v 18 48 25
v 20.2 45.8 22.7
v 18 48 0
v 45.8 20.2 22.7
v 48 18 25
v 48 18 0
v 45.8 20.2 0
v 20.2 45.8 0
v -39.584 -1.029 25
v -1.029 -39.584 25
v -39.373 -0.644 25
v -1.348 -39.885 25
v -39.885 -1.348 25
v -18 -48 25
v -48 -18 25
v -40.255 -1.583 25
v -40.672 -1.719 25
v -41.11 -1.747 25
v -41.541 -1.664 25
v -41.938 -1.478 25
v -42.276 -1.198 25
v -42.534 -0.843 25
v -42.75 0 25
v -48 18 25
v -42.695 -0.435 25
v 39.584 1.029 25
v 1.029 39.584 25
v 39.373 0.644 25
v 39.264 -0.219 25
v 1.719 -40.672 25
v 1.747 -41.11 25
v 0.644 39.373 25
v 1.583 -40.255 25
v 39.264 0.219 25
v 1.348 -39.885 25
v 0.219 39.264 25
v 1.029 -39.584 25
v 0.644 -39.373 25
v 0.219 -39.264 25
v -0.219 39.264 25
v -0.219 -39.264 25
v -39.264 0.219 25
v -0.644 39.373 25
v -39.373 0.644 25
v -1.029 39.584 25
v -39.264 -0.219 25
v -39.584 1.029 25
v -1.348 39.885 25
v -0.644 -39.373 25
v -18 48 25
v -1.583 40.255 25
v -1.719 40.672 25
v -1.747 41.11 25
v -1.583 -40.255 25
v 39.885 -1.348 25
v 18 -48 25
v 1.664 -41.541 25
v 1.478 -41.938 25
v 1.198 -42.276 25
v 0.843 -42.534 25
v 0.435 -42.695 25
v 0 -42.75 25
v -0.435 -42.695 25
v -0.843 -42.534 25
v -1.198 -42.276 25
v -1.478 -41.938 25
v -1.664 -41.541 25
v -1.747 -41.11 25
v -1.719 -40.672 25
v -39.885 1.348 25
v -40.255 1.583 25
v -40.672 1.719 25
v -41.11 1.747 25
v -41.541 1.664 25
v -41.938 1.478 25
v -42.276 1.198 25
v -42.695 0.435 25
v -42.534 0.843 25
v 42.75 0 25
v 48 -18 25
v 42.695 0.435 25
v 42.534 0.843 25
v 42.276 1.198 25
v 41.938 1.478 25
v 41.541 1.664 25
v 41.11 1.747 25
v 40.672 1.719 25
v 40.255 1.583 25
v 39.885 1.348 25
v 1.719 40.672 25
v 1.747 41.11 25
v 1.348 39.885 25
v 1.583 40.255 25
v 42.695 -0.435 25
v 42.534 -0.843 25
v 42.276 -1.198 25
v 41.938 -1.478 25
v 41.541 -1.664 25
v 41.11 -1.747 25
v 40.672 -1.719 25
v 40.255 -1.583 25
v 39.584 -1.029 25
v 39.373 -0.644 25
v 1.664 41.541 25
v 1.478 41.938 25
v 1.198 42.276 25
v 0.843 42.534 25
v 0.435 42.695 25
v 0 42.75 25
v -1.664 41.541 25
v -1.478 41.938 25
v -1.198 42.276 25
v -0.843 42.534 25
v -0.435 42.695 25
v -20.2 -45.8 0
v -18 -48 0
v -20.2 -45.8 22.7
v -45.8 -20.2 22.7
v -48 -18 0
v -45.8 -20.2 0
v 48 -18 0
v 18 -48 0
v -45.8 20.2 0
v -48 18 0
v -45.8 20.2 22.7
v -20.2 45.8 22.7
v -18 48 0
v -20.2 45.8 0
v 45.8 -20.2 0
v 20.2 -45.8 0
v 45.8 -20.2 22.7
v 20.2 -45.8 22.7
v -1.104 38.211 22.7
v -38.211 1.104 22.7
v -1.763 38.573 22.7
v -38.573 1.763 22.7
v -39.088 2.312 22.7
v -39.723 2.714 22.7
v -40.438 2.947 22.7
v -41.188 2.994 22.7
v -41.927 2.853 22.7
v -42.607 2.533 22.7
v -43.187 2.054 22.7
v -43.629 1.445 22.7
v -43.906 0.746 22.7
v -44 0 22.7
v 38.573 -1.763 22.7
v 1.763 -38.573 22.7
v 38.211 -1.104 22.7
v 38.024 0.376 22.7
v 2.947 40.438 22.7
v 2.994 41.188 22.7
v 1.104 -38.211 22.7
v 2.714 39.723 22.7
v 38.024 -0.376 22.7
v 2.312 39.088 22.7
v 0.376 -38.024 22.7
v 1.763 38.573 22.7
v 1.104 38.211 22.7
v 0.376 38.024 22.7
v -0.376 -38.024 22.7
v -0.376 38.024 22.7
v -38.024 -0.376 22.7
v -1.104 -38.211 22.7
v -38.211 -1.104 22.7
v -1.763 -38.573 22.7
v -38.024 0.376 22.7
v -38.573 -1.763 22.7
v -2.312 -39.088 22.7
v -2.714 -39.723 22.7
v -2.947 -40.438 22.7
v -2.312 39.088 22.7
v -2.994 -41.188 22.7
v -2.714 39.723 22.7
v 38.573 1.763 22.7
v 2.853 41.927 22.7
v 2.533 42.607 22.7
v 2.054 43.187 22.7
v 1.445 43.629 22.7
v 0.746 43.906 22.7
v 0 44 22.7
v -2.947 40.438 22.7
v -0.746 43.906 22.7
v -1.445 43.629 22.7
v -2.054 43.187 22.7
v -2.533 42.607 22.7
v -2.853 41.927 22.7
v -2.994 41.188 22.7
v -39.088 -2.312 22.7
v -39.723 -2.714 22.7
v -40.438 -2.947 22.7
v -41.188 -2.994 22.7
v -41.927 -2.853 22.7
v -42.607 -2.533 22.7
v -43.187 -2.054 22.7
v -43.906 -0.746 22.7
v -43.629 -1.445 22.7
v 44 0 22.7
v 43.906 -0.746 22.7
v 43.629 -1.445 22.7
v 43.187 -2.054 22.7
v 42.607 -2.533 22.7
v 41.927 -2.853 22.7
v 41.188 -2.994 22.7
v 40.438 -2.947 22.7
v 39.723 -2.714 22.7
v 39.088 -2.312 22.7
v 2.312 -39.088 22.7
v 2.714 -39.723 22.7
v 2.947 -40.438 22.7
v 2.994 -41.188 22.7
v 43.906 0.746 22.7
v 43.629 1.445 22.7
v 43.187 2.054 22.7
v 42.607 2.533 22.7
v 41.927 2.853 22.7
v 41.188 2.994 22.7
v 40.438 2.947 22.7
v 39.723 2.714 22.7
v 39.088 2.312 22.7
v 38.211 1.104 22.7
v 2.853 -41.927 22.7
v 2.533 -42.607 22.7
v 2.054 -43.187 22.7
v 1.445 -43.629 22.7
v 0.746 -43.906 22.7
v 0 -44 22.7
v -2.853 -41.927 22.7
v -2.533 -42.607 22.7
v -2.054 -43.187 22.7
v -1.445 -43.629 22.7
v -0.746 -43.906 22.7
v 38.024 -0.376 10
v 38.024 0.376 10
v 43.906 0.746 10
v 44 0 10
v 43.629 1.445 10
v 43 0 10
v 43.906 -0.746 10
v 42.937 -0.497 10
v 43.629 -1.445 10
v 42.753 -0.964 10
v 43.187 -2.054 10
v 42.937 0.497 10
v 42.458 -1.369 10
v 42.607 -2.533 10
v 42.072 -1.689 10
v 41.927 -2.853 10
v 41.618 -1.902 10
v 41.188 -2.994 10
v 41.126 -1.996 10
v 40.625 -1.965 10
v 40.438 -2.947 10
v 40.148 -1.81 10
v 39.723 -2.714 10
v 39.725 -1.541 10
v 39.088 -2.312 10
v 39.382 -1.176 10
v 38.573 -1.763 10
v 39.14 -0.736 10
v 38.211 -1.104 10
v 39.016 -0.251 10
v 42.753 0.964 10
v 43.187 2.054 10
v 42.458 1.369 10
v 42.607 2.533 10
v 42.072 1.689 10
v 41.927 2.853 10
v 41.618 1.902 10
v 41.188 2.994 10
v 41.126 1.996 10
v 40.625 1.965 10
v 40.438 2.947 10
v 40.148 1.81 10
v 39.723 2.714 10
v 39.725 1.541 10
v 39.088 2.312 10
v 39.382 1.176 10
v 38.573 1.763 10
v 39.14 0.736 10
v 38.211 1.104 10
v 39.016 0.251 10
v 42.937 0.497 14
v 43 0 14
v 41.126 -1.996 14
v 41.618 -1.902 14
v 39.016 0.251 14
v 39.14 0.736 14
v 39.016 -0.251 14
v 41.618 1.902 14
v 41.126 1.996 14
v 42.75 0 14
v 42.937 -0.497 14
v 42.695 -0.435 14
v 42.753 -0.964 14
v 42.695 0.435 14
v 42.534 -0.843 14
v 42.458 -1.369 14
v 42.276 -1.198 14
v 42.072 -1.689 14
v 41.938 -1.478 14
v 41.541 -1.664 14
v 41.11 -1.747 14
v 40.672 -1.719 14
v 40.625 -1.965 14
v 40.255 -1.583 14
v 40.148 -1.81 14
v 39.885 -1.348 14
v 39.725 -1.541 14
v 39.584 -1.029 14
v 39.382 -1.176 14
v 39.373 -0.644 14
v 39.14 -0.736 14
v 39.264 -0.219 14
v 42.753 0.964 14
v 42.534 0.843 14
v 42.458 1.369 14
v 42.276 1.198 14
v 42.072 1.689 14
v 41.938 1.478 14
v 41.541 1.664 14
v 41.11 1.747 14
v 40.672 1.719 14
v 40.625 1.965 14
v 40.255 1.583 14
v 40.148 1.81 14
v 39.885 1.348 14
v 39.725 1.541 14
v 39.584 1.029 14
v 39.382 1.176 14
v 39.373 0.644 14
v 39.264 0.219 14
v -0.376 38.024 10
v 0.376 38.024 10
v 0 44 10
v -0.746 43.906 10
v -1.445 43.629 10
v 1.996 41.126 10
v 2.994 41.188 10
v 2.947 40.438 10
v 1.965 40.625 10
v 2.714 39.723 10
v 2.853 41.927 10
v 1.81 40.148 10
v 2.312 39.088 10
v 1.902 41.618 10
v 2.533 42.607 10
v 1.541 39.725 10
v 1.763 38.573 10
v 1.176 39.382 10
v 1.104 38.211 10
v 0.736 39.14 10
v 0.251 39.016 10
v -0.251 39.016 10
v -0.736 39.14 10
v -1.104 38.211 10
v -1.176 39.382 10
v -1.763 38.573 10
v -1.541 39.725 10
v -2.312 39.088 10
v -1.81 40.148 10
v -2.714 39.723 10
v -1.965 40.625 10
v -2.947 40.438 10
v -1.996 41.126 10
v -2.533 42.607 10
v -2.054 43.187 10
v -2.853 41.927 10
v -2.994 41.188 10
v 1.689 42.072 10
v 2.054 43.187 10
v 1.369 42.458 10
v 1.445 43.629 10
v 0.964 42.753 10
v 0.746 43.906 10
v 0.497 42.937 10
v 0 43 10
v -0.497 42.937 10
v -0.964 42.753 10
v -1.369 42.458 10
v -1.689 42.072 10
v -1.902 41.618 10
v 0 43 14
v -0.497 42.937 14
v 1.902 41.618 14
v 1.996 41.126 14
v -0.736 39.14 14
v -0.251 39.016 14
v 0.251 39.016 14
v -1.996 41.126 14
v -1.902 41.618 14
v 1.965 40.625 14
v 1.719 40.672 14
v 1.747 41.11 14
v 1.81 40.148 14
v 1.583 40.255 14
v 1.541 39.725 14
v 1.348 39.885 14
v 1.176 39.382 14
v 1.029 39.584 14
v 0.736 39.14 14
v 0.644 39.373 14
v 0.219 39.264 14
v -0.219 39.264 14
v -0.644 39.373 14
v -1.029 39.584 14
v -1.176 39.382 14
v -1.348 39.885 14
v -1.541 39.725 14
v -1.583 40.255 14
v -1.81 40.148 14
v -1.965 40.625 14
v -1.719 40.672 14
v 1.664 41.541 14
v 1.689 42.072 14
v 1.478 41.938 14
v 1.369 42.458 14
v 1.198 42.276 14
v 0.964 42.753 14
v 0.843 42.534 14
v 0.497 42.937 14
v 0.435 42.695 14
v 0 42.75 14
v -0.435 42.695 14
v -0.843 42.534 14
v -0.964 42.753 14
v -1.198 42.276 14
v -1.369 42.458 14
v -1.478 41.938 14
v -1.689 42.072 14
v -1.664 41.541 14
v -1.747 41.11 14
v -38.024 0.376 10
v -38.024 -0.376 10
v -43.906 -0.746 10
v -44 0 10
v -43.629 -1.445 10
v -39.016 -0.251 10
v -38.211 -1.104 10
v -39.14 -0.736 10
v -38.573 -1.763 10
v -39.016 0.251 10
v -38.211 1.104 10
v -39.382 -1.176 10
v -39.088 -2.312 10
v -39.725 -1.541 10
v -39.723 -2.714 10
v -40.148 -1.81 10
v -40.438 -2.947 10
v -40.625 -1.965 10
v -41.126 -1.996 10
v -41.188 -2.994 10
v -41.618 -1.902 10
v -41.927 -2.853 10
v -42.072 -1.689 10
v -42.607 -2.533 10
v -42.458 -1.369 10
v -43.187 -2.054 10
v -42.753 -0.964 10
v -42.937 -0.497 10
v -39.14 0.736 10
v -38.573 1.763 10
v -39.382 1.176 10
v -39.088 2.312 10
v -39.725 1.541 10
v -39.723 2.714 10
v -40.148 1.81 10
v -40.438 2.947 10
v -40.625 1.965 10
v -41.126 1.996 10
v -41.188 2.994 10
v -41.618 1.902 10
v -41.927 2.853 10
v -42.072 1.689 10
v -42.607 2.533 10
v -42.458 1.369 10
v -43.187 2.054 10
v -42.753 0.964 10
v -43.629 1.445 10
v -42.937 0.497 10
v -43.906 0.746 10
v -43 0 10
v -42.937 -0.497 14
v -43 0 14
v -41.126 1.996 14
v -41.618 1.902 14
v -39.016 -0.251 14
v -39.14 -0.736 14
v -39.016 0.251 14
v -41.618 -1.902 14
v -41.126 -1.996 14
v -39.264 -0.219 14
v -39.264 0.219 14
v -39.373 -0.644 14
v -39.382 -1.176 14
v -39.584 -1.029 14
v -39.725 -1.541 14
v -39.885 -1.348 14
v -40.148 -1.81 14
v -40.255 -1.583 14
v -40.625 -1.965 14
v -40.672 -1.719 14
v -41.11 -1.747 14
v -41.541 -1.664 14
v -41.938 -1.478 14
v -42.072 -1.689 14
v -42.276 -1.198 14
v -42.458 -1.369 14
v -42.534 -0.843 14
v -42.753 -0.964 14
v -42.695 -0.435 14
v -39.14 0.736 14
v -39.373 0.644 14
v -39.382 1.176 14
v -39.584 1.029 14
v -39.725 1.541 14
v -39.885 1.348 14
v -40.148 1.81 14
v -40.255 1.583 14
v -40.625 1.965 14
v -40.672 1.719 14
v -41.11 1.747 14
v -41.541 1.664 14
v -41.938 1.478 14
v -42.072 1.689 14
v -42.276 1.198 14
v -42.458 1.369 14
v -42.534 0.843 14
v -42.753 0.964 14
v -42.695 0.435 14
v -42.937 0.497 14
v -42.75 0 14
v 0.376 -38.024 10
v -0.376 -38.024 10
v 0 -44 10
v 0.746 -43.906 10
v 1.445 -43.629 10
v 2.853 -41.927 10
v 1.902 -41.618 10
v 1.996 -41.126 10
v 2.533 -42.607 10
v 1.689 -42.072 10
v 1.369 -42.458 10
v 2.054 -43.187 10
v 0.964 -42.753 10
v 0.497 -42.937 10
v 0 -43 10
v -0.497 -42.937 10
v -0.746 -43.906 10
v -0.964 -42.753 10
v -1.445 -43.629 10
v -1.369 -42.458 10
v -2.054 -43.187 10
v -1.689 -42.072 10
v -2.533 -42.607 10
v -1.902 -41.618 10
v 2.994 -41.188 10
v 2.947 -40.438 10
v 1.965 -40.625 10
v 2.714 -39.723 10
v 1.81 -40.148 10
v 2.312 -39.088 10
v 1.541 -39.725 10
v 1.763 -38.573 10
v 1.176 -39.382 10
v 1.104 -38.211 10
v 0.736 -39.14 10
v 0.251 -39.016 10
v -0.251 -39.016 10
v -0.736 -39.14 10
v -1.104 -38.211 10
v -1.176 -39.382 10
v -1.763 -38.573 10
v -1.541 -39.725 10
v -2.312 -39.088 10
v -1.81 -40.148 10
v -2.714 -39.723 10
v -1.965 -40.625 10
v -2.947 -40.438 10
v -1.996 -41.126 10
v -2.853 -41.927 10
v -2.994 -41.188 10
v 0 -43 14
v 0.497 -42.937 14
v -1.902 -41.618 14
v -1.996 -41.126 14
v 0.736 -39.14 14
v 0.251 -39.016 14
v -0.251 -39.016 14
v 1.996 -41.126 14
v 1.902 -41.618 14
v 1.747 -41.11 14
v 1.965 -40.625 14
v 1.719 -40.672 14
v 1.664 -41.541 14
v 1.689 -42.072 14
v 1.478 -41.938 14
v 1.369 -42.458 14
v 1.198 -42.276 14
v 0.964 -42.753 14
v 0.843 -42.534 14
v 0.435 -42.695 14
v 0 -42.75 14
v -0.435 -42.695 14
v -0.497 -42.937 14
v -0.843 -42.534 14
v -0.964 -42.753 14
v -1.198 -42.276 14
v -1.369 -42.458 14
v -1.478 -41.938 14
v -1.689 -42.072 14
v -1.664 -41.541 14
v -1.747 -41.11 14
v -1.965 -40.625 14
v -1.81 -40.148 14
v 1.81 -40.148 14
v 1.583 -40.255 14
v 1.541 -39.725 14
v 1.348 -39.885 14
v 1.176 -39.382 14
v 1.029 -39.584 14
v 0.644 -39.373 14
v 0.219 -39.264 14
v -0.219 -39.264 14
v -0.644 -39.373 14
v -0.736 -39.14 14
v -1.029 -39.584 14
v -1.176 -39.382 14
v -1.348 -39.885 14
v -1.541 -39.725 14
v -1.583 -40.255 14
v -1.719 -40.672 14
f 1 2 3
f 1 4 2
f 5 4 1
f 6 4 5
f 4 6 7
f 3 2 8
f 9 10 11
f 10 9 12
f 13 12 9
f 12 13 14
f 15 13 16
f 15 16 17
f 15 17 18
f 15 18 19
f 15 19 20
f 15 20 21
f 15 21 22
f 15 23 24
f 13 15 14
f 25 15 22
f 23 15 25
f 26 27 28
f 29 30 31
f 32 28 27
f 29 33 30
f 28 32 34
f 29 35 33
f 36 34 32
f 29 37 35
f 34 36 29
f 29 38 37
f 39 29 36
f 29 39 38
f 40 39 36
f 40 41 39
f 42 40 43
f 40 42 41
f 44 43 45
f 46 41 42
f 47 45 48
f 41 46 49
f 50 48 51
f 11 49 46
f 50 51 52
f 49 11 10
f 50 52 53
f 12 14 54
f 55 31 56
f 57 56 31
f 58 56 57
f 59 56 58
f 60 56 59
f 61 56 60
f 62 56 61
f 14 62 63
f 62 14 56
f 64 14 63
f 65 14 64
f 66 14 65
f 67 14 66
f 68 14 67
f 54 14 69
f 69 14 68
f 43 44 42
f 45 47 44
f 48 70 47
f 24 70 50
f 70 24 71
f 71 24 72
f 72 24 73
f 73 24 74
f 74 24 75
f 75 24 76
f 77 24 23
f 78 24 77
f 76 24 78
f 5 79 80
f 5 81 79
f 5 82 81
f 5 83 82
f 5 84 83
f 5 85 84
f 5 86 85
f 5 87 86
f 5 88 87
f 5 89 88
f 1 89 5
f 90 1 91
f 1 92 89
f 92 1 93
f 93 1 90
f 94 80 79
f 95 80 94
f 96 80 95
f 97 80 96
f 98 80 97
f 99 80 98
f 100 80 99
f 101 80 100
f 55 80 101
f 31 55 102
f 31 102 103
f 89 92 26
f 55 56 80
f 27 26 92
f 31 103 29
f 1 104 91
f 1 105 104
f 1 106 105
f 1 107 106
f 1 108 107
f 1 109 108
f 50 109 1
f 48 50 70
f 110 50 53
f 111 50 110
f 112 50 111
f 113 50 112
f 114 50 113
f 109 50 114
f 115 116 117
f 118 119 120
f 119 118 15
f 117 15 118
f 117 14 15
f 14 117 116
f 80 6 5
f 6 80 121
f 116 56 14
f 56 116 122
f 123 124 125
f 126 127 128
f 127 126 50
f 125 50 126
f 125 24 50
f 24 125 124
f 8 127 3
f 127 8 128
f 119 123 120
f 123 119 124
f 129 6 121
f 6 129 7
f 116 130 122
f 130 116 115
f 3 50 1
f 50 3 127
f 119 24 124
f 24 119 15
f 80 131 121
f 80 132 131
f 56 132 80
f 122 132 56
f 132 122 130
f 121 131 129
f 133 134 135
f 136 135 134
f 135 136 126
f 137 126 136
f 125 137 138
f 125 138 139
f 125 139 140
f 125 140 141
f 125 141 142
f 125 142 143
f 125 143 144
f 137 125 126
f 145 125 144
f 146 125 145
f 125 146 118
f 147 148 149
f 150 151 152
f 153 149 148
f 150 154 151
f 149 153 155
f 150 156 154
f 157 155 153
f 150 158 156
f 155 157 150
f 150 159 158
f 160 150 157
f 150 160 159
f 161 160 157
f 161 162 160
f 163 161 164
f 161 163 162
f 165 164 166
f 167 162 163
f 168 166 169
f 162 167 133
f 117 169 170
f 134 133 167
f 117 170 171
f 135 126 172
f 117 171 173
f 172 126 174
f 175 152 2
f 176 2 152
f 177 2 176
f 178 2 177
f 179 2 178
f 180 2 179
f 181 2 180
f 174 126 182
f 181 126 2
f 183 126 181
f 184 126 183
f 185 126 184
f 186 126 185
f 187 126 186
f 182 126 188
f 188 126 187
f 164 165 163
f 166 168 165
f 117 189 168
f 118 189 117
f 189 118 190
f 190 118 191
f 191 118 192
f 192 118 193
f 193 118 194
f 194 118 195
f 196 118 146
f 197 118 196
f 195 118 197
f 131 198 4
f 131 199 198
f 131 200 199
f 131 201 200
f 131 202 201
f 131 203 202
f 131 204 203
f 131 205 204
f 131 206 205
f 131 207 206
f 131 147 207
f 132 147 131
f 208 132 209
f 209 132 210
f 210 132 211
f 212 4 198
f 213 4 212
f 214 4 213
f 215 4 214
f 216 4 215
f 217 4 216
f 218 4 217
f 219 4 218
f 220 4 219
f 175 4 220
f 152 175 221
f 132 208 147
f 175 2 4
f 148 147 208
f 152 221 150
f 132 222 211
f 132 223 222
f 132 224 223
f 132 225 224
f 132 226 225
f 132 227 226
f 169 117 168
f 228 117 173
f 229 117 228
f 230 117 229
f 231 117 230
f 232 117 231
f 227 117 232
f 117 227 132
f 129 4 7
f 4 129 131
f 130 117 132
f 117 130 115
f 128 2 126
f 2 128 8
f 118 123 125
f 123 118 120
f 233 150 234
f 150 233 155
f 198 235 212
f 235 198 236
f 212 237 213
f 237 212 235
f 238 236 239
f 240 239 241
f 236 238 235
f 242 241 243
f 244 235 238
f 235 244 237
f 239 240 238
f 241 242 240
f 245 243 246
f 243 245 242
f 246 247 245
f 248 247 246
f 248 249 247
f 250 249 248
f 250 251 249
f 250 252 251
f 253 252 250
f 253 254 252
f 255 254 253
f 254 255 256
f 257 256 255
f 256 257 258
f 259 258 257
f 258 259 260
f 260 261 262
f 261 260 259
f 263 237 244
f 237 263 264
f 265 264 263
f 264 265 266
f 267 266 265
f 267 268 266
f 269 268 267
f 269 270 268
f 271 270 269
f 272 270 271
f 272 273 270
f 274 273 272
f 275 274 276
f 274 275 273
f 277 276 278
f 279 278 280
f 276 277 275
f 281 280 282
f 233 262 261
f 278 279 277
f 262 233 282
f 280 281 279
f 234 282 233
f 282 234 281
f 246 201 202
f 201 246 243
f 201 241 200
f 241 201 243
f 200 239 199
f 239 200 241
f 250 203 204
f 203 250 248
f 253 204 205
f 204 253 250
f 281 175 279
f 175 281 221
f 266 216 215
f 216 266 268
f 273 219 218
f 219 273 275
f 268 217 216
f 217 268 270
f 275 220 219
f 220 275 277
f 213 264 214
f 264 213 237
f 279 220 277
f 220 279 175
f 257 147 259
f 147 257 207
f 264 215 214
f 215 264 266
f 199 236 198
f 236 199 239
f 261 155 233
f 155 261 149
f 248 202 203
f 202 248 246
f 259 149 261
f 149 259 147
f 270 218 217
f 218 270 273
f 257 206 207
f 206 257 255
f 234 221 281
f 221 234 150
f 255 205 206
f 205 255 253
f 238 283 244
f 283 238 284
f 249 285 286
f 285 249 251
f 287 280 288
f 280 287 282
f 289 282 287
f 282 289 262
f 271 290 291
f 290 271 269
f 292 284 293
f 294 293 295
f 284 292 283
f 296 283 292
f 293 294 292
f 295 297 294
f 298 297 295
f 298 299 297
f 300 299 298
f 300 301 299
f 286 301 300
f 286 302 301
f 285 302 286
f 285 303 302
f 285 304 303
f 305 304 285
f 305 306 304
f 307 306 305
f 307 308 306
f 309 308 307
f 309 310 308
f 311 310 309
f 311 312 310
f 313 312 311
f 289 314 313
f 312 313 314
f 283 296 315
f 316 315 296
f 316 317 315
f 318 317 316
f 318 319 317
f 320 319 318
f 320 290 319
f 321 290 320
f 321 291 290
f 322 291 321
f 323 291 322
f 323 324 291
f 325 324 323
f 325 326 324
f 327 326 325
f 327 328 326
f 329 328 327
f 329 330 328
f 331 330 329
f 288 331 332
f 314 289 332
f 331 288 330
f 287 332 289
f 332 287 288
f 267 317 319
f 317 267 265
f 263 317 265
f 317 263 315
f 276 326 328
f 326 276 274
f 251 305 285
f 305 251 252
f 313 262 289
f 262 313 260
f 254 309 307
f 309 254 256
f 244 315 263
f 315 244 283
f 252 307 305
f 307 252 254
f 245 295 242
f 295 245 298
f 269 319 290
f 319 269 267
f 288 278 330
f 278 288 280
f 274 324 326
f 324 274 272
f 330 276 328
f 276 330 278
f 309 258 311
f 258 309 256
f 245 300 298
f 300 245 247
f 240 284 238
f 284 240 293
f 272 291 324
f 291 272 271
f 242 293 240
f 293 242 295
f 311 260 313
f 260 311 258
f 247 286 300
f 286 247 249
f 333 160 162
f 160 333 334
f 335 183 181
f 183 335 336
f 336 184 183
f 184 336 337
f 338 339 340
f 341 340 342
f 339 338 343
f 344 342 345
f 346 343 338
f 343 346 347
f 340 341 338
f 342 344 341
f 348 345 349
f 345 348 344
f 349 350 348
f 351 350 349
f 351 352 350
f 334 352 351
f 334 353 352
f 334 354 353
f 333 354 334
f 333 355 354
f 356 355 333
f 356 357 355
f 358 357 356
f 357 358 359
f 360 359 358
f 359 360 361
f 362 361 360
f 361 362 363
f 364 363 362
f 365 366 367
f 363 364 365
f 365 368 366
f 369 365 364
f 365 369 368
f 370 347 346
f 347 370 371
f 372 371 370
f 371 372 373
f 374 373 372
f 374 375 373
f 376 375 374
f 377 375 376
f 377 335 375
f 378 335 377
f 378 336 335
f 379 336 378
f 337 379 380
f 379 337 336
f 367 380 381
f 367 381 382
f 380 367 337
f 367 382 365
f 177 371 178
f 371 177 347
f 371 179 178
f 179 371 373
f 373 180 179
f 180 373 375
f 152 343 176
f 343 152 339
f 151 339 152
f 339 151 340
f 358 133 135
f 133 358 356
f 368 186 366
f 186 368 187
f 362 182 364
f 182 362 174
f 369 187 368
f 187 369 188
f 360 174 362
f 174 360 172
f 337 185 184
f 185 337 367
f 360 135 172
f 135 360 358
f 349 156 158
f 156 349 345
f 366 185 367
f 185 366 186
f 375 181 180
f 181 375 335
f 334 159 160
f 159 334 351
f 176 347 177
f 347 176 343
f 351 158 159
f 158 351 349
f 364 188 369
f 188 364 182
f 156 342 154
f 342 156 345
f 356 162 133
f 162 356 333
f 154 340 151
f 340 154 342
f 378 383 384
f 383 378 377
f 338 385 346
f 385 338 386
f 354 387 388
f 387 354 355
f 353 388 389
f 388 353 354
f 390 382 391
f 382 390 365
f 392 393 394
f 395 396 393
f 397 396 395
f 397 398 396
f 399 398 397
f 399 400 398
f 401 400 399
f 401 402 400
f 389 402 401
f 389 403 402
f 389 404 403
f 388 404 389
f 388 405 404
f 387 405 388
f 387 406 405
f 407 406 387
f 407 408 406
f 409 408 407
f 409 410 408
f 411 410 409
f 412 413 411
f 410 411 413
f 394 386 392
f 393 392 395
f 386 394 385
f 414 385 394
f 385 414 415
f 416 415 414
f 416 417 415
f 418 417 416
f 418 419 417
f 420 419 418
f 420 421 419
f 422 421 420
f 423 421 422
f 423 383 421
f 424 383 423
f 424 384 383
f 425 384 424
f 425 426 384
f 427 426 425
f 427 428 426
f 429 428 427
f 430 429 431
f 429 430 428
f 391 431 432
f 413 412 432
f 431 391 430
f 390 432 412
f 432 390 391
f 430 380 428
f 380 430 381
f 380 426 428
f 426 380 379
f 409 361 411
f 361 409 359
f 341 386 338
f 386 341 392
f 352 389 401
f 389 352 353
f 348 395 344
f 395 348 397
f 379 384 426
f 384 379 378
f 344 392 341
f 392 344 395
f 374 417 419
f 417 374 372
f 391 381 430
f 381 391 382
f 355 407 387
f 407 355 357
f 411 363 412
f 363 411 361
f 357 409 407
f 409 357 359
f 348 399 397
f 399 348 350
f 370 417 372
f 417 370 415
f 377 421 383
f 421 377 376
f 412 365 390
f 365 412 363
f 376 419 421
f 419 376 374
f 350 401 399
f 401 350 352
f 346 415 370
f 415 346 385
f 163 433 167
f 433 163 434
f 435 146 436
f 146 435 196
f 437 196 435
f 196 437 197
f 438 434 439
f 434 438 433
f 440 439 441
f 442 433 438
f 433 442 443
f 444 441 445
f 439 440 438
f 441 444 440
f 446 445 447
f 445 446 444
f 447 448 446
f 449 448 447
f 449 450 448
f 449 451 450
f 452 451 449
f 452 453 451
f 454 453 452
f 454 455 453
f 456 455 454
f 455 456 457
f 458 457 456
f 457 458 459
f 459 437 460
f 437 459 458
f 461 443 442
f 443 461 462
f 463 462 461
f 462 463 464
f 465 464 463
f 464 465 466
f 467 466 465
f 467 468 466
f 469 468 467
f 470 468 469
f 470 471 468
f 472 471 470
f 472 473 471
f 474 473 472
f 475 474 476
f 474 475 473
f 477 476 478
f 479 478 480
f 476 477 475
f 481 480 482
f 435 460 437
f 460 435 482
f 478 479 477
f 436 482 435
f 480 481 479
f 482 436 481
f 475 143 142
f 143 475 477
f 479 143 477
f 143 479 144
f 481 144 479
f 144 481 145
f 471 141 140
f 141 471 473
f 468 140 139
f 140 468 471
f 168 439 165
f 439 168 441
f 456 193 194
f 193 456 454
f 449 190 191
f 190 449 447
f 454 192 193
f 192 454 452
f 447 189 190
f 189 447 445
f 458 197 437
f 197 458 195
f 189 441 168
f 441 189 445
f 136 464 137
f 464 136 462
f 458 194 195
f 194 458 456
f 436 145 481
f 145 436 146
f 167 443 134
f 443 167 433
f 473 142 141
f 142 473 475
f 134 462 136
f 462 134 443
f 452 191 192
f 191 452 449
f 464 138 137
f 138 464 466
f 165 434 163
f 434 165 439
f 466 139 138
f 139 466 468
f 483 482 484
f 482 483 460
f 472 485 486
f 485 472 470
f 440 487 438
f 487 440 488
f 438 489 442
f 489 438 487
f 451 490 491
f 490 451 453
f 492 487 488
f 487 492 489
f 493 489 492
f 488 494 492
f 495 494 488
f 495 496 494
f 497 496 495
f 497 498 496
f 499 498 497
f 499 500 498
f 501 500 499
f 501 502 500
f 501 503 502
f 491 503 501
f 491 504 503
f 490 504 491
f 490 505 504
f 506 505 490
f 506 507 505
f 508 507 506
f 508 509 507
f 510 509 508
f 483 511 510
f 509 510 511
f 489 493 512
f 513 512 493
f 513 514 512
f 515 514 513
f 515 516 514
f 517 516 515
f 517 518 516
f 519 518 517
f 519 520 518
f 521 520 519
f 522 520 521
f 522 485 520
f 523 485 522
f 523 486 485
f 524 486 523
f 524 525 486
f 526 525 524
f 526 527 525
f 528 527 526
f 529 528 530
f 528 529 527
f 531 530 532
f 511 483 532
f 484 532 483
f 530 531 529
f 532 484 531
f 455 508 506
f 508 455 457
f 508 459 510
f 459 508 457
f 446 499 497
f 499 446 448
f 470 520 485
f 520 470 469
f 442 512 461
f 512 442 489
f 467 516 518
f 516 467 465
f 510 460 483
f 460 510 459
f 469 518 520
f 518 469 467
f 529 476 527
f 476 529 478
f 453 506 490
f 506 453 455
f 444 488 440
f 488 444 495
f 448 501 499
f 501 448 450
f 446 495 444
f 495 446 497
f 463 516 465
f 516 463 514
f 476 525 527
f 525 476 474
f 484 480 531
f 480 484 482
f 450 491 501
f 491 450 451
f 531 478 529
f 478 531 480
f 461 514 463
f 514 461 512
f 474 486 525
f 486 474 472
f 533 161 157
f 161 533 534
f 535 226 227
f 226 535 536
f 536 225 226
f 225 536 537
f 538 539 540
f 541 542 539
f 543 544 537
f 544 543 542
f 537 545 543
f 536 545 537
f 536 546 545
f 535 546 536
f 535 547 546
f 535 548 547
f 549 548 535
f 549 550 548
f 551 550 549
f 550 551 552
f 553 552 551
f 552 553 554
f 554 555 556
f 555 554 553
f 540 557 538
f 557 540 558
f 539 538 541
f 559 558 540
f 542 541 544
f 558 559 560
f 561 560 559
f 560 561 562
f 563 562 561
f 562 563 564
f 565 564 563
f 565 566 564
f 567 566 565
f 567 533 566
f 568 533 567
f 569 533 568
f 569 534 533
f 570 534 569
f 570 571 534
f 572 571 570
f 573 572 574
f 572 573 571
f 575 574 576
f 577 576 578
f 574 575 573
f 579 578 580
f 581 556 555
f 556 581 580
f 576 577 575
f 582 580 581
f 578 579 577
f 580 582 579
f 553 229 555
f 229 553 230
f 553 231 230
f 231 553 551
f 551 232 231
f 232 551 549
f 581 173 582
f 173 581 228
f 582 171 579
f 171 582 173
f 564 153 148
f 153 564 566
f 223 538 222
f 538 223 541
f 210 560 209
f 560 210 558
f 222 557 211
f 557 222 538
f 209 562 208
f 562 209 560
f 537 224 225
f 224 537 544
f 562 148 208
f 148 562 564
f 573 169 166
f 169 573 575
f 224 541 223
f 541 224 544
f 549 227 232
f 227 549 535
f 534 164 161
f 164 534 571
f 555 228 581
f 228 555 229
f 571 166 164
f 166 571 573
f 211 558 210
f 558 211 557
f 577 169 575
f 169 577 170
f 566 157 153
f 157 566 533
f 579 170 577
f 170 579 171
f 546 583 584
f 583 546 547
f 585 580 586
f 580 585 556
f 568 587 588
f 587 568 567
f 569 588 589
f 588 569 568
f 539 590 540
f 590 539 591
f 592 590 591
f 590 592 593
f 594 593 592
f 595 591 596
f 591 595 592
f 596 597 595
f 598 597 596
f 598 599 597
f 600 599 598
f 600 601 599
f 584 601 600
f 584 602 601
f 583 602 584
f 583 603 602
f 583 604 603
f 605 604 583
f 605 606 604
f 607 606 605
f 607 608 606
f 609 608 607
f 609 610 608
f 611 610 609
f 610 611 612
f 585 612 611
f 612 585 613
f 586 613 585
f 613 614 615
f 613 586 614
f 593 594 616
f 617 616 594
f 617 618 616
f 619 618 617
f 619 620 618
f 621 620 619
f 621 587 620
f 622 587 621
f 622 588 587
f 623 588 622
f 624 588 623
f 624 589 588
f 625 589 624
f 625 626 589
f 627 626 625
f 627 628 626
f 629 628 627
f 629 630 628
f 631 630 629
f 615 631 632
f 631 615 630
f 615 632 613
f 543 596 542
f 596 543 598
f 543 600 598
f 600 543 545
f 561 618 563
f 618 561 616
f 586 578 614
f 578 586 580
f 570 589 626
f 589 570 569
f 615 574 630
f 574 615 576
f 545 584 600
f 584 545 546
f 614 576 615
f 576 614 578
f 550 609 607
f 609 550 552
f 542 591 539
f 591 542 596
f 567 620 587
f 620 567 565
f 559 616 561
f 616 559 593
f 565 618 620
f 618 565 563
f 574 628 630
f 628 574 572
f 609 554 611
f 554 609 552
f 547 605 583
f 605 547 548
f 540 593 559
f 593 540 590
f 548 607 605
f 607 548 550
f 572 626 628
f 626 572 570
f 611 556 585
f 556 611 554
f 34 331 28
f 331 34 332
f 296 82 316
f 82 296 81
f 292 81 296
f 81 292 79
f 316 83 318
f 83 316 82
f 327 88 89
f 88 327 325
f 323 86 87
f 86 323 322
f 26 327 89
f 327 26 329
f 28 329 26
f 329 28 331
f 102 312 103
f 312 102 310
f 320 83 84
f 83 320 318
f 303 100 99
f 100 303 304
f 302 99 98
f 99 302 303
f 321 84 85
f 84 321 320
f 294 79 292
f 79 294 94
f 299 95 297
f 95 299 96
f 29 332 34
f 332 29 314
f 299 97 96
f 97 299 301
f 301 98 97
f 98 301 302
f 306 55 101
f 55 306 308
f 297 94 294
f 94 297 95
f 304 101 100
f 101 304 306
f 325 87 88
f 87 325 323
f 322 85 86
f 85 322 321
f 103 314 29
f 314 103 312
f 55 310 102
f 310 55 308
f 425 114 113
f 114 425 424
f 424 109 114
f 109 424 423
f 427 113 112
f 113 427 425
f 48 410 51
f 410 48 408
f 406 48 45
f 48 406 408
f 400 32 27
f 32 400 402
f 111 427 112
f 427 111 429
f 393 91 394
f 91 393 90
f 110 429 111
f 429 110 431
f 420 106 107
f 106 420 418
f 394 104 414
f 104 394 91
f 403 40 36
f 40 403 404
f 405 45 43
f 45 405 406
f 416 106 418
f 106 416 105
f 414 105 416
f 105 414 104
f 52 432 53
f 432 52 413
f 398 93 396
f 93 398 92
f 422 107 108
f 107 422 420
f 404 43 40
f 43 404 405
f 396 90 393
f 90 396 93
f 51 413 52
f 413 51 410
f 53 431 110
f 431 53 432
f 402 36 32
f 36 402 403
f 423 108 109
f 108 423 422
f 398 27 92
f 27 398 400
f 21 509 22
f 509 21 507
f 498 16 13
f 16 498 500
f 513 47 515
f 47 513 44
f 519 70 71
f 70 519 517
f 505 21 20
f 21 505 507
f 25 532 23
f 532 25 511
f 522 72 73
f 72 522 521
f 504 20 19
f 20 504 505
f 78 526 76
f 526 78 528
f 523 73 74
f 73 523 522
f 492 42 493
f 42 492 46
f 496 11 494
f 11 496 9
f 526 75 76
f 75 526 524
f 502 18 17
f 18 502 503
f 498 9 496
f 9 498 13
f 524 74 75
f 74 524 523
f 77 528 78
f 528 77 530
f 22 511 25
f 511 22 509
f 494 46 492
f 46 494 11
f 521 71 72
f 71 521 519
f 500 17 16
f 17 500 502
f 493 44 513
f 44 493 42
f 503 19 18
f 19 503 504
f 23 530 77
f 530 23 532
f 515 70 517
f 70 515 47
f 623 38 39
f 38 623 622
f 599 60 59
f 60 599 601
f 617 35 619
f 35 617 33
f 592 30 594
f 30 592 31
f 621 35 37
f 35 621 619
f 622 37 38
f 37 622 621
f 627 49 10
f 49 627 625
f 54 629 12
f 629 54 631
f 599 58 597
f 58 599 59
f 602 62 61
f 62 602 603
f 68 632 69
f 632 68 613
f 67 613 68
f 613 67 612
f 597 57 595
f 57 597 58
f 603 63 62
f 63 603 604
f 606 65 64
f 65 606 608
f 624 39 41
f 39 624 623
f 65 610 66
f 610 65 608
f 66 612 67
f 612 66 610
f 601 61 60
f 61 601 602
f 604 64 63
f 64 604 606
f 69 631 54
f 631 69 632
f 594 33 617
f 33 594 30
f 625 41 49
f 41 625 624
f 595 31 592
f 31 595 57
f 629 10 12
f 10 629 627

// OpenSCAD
// file: ../util/hole3.scad
module hole3()
{
    cylinder(d=3.5, h=99, center=true);
}
// file: ../util/repeat4.scad
module repeat4()
{
    for (r=[0:3])
    rotate([0,0,90*r])
    children();
}
// file: ../util/hexapath.scad
// Follow an hexagonal path
module hexapath(X, Y, thickness, center=false)
{
    union() {
        linear_extrude(thickness, center=center)
            polygon(points=[
                    [X, Y], [X, -Y], 
                    [Y, -X], [-Y, -X],
                    [-X, -Y], [-X, Y],
                    [-Y, X], [Y, X], 
            ]);
    }
}
// file: ../models/ollo.scad
// Diameter of plastic ollo holes
OlloHoles = 4.3;

// Width of Ollo "real" plastic
OlloWidth = 3;

// Distance between two ollo holes
OlloSpacing = 6;

// Do an Ollo hole on the part
module olloHole(depth=2.2)
{
    translate([0,0,-0.1])
      cylinder(depth+0.2, OlloHoles/2, OlloHoles/2);
}

// Do 3 ollo holes
module threeOllo(depth=2.2)
{
  for (xy=[[-OlloSpacing,0],[0,0],[OlloSpacing,0]]) {
    translate([xy[0], xy[1], 0])
    olloHole(depth);
  }
}

// Do a servo arm holes
module servoArm(depth=2.2)
{
    threeOllo(depth);
    rotate([0,0,90])
      threeOllo(depth);
}
// main file
use <../models/ollo.scad>;
use <../util/hexapath.scad>;
use <../util/repeat4.scad>;
use <../util/hole3.scad>;

$fn=25;

module head(height=25, thickness=2.2, print=false) {
    // The layout path
    X=48;
    Y=18;

    if (print) {
        translate([0,0,height])
        rotate([-180,0,0])
        head(height, thickness, false);
    } else {
        difference() {
            union() {    
                difference() {    
                    hexapath(X, Y, thickness=height);
                    
                    // Craving the inside
                    translate([0,0,-0.1])
                    hexapath(X-thickness, Y+3, thickness=height-thickness);
                }
        
                // Spacers
                repeat4()
                translate([41,0,0])
                difference() {
                    translate([0,0,10])
                    cylinder(d=6, h=height-10);
                    translate([0,0,-1])
                    cylinder(d=4, h=height-10);
                }
            }
            
                    
            // Holes for magnets
            repeat4()
            translate([41,0,0])
            hole3();
        }
    }
}

head(thickness=2.2);
